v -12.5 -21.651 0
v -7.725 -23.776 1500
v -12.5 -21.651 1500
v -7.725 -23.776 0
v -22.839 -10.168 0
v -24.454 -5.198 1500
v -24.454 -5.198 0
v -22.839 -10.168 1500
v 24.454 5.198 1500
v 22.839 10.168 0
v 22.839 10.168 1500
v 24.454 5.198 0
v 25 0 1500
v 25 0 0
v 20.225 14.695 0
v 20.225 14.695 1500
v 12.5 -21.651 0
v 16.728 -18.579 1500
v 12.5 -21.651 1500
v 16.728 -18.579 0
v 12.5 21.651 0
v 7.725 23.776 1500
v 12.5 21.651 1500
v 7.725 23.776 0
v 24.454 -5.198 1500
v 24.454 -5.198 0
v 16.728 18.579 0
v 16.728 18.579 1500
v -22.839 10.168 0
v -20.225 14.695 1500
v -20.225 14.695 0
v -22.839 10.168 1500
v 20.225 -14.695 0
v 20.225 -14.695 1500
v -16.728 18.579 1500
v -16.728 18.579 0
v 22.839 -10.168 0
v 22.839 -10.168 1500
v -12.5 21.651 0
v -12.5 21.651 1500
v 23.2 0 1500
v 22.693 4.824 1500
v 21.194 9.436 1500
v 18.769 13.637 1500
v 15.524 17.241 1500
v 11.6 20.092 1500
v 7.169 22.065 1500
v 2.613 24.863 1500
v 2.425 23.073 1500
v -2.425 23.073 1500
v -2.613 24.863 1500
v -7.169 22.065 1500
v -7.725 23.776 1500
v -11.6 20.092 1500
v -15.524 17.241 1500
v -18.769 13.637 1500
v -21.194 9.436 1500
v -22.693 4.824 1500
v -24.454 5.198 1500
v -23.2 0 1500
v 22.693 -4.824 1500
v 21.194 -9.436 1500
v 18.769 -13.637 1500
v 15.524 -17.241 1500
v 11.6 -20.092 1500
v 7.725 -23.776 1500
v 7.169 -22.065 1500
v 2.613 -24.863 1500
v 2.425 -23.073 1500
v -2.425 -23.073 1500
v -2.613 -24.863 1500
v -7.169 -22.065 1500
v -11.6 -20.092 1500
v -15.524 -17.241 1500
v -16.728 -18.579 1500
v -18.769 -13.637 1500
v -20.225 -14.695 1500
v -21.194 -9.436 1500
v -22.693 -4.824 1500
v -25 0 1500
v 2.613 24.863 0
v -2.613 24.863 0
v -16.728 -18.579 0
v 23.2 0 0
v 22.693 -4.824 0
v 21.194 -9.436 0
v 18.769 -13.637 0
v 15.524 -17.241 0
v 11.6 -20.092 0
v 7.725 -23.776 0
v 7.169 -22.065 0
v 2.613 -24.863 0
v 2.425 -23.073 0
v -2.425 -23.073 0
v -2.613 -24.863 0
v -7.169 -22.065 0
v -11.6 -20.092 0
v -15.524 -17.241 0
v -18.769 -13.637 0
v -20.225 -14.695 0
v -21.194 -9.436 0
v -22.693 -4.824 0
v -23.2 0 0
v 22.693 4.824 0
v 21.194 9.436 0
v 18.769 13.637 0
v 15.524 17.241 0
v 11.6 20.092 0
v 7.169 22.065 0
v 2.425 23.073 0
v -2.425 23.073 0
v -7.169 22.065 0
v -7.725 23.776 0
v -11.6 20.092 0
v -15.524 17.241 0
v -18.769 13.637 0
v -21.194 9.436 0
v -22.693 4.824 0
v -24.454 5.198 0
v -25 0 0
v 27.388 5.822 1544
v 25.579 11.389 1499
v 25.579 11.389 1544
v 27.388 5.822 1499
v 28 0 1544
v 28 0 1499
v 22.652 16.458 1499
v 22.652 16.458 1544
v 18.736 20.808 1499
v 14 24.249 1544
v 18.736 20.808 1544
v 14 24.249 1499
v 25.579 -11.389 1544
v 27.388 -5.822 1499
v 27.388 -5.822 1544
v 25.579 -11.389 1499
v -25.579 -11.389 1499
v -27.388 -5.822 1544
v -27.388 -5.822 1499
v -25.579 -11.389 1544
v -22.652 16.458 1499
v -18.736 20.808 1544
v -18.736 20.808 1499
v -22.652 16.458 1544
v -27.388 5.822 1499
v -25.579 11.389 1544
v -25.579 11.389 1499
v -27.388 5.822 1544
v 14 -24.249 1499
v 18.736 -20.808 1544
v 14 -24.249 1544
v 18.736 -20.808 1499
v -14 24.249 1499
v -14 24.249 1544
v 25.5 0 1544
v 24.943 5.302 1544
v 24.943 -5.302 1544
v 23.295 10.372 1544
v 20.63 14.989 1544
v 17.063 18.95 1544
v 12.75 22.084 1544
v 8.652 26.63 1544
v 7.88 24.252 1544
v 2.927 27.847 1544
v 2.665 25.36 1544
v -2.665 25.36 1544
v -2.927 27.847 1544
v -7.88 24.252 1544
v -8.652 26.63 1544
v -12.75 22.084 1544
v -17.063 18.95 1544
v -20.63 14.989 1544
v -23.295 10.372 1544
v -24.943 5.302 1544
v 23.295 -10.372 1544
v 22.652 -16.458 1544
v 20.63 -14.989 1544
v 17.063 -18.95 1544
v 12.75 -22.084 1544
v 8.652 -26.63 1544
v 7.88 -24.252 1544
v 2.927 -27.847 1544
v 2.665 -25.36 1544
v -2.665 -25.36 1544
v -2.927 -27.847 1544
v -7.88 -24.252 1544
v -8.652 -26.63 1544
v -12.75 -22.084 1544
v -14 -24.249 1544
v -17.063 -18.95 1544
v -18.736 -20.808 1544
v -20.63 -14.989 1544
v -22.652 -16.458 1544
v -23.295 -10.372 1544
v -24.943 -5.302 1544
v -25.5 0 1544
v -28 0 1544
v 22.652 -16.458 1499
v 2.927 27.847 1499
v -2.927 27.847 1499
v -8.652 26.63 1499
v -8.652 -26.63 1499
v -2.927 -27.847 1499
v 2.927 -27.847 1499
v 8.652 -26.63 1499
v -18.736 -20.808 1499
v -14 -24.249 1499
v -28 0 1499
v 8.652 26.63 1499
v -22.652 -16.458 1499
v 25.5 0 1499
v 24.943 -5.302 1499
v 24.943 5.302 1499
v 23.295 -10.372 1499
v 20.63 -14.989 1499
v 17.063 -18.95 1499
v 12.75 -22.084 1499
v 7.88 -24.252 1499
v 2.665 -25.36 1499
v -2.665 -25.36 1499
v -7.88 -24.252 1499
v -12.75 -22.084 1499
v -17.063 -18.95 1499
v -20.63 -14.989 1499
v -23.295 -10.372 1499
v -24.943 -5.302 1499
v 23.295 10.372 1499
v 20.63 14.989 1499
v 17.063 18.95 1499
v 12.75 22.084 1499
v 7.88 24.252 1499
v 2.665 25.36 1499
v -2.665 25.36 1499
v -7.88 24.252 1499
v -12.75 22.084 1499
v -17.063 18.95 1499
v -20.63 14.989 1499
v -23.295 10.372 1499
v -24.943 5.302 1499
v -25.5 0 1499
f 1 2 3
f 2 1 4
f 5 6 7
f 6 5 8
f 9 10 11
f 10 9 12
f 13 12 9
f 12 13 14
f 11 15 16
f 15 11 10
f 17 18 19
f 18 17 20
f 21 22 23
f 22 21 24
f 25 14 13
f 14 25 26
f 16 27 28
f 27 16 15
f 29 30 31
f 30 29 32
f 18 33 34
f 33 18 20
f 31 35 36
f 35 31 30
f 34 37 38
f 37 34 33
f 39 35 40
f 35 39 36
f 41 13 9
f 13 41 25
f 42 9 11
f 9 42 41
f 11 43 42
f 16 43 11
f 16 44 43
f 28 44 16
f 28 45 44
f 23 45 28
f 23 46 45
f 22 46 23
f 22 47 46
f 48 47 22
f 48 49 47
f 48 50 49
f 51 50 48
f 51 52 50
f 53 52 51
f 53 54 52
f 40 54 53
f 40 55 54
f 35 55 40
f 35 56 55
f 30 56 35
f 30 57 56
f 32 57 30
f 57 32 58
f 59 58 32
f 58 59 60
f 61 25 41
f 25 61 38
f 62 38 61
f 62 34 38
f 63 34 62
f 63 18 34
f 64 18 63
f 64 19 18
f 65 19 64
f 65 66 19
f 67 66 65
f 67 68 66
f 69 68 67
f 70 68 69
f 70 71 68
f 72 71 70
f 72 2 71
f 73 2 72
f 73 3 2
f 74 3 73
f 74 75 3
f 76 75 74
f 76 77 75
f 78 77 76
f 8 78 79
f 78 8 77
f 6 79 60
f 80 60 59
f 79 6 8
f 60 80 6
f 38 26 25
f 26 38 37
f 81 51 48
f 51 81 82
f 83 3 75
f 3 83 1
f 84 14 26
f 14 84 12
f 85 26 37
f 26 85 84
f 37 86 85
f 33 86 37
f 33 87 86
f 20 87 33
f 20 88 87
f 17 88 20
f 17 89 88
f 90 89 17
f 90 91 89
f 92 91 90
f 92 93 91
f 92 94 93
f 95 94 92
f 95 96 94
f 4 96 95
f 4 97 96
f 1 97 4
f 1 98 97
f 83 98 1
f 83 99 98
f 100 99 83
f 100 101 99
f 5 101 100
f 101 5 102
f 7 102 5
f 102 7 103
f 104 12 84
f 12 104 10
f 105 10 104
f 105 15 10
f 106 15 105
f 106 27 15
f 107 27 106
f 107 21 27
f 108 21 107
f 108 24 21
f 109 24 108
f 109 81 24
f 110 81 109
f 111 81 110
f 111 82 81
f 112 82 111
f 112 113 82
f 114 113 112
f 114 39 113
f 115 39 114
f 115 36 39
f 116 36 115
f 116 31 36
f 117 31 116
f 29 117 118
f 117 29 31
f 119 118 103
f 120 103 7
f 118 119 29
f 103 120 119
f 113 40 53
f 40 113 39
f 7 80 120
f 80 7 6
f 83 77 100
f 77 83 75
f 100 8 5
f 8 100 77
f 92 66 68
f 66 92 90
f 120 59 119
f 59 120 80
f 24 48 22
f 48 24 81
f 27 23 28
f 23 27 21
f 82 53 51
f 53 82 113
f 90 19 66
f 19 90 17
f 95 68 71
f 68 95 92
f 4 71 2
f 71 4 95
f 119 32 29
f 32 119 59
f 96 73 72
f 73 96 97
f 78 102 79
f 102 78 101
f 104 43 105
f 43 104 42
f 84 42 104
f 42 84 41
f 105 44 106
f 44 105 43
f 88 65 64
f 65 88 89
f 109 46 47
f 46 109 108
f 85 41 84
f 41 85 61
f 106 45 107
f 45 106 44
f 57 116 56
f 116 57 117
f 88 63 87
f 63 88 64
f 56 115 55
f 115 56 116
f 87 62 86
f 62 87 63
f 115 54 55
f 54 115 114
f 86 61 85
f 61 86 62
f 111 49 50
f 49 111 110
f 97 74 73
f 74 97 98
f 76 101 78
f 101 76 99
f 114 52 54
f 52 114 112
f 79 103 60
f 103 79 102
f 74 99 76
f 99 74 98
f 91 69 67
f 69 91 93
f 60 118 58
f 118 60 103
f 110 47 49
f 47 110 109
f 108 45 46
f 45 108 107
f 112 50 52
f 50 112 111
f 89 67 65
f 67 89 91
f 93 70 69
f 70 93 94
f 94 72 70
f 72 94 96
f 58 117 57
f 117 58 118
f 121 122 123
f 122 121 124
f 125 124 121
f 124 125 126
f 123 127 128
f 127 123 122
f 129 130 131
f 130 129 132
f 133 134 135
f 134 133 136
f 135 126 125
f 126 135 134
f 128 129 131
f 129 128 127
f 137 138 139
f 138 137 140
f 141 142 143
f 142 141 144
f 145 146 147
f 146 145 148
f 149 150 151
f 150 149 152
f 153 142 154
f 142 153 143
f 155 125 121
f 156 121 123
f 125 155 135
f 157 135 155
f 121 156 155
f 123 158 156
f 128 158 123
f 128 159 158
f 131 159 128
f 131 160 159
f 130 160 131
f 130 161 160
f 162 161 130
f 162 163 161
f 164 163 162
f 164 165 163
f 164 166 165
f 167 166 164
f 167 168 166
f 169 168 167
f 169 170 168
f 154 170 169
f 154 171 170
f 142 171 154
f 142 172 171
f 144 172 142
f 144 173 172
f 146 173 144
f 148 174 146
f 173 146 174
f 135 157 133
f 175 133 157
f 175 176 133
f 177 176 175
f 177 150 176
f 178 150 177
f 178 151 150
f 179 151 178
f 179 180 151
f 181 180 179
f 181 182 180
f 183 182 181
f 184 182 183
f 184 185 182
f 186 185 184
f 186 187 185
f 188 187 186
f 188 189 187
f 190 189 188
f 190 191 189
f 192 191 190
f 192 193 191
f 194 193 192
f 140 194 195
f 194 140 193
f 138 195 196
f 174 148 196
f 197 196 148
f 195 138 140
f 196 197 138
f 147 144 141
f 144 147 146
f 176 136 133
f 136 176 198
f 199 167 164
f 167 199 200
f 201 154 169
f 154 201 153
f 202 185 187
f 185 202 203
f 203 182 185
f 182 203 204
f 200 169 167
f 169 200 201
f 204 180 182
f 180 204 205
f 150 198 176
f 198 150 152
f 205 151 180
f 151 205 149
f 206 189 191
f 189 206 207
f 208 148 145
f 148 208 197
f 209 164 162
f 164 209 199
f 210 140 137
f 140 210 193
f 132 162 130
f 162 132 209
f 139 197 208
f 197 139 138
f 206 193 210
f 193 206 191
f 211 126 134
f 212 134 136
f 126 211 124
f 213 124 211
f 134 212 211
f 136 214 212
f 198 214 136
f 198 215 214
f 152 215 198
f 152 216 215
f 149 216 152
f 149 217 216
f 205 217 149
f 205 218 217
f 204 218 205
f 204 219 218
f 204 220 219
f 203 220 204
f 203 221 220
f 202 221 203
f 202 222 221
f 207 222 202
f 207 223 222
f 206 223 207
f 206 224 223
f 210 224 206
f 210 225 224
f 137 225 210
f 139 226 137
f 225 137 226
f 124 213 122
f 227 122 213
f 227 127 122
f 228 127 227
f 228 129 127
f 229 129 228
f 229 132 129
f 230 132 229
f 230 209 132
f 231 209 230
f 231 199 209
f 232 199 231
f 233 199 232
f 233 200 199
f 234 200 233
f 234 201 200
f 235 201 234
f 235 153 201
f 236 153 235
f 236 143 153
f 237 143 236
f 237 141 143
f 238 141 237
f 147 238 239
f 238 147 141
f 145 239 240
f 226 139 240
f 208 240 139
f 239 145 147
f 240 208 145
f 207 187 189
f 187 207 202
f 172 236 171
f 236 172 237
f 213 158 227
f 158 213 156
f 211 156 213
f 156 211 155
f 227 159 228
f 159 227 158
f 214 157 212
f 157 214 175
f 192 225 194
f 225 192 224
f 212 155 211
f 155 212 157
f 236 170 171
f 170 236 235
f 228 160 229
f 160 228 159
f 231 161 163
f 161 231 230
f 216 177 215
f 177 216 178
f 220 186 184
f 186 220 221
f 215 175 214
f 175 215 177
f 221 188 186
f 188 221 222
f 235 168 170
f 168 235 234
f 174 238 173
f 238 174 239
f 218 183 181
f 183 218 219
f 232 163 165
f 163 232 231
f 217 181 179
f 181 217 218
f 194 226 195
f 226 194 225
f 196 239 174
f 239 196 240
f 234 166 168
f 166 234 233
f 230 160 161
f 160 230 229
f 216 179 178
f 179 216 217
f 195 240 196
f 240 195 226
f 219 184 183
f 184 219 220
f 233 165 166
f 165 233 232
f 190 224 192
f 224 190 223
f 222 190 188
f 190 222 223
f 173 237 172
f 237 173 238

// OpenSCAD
// Parameters
pipe_standard = 0; //[0:0:1]
nominal_size = 50; //[25:110:1]
length_mm = 1500; //[750:3000:10]
ht50_outer_diameter = 50; //[40:75:0.5]
ht50_wall_thickness = 1.8; //[1.0:3.5:0.1]
fitting_length = 45; //[25:90:1]
fitting_outer_diameter = 56; //[52:70:0.5]
fitting_wall_thickness = 2.5; //[1.5:5:0.1]
fitting_stop_ring_length = 6; //[3:15:0.5]
fitting_stop_ring_thickness = 1.5; //[0.8:4:0.1]
overlap = 1; //[0.5:2:0.1]

// Module for the hollow pipe body
module hollow_tube_body() {
  difference() {
    cylinder(h=length_mm, r=ht50_outer_diameter/2, center=false);
    translate([0, 0, 0])
      cylinder(h=length_mm, r=ht50_outer_diameter/2 - ht50_wall_thickness, center=false);
  }
}

// Module for the end fitting
module end_fitting() {
  difference() {
    cylinder(h=fitting_length, r=fitting_outer_diameter/2, center=false);
    translate([0, 0, 0])
      cylinder(h=fitting_length, r=fitting_outer_diameter/2 - fitting_wall_thickness, center=false);
    translate([0, 0, fitting_length - fitting_stop_ring_length])
      cylinder(h=fitting_stop_ring_length, r=(fitting_outer_diameter/2 - fitting_wall_thickness) - fitting_stop_ring_thickness, center=false);
  }
}

// Module for the complete HT pipe
module ht_pipe() {
  color([0.85, 0.85, 0.8]) { // Off-white for PVC
    union() {
      hollow_tube_body();
      translate([0, 0, length_mm - overlap]) end_fitting();
    }
  }
}

// Assembly module
module assembly() {
  ht_pipe();
}

// Call the assembly
assembly();
